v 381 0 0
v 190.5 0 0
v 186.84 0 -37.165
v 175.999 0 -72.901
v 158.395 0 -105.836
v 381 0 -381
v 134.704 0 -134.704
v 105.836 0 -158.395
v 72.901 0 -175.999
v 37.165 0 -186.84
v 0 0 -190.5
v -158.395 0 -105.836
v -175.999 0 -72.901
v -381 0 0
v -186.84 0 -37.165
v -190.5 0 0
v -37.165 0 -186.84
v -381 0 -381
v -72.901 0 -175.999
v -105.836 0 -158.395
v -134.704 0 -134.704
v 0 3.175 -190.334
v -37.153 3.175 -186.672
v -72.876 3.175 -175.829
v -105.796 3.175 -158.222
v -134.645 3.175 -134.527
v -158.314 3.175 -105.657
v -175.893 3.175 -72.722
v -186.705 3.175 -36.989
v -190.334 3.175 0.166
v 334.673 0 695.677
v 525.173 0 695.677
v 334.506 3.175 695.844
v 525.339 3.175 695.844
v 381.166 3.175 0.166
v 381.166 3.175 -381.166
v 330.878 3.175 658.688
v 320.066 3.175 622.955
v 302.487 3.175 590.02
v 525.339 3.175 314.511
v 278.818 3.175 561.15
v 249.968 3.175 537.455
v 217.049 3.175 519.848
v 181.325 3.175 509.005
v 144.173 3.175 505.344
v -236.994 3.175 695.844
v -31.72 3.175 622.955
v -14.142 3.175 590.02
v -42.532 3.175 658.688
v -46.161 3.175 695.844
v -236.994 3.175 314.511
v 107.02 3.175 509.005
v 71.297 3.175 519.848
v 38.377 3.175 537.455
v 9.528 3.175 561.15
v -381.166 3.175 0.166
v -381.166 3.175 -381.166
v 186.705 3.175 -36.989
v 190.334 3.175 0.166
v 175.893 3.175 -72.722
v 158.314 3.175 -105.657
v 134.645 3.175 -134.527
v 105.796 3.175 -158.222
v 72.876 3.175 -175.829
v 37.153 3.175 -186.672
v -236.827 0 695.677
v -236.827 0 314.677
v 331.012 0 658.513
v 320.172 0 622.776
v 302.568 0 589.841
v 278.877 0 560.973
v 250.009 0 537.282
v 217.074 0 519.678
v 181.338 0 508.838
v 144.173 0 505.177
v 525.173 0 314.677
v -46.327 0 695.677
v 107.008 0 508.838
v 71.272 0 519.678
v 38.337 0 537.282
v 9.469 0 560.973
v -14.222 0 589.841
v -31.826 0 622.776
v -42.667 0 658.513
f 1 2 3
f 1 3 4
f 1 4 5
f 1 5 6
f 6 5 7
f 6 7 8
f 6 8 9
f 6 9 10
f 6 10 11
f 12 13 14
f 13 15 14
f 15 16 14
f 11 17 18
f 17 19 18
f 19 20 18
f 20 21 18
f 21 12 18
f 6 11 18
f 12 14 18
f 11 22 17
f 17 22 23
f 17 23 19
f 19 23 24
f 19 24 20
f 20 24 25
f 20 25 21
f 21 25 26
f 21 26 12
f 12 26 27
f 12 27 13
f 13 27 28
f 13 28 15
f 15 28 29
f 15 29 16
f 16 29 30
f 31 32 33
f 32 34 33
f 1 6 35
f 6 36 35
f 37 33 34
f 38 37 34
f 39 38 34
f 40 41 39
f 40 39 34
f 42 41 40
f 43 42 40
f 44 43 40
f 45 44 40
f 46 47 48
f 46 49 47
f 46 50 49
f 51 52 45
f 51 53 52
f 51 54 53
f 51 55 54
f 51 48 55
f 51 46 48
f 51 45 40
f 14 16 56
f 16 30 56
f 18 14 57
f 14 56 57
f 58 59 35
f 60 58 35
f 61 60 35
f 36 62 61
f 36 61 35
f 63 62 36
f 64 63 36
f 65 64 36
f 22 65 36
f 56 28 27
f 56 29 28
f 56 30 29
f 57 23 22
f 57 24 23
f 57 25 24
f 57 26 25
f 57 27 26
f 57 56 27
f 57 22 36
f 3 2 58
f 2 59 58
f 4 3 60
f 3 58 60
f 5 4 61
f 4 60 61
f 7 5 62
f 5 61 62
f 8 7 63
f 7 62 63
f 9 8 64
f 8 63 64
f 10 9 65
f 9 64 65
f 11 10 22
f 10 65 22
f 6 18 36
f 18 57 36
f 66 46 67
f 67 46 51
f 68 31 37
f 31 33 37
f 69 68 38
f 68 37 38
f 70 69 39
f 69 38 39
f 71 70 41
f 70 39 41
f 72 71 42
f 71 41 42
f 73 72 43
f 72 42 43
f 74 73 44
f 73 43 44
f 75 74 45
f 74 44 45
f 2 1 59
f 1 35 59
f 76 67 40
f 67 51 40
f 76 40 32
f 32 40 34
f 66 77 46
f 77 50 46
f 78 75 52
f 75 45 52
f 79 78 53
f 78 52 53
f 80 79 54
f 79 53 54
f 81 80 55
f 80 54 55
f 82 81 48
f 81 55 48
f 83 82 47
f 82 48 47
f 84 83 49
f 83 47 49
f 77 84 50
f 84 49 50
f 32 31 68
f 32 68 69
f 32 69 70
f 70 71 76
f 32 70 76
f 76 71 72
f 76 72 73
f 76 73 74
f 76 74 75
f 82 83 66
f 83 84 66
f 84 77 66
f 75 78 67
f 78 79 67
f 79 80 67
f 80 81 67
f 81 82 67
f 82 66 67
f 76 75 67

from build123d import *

# Parameters (mm, degrees)
F1_DEPTH = 3.175
F1_TAPER = -3
F2_DEPTH = 3.175


with BuildPart() as f1:
    # F0 (on Front) → F1 (new body)
    with BuildSketch(Plane.XZ):
        with BuildLine():
            ThreePointArc((144.1728167931, 505.1773030703), (9.4689749771, 560.9734612542), (-46.3271832069, 695.6773030703))
            Line((-46.3271832069, 695.6773030703), (-236.8271832069, 695.6773030703))
            Line((-236.8271832069, 695.6773030703), (-236.8271832069, 314.6773030703))
            Line((-236.8271832069, 314.6773030703), (144.1728167931, 314.6773030703))
            Line((144.1728167931, 314.6773030703), (525.1728167931, 314.6773030703))
            Line((525.1728167931, 314.6773030703), (525.1728167931, 695.6773030703))
            Line((525.1728167931, 695.6773030703), (334.6728167931, 695.6773030703))
            ThreePointArc((334.6728167931, 695.6773030703), (278.8766586092, 560.9734612542), (144.1728167931, 505.1773030703))
        make_face()
    extrude(amount=-F1_DEPTH, taper=F1_TAPER)


with BuildPart() as f1b:
    # F0 (on Front) → F1, piece 2 (new body)
    with BuildSketch(Plane.XZ):
        with BuildLine():
            ThreePointArc((0, -190.5), (-134.703841816, -134.703841816), (-190.5, 0))
            Line((-190.5, 0), (-381, 0))
            Line((-381, 0), (-381, -381))
            Line((-381, -381), (0, -381))
            Line((0, -381), (381, -381))
            Line((381, -381), (381, 0))
            Line((381, 0), (190.5, 0))
            ThreePointArc((190.5, 0), (134.703841816, -134.703841816), (0, -190.5))
        make_face()
    extrude(amount=-F1_DEPTH, taper=F1_TAPER)

    # F0 (on Front) → F2 (join)
    with BuildSketch(Plane.XZ):
        with BuildLine():
            ThreePointArc((0, -190.5), (-134.703841816, -134.703841816), (-190.5, 0))
            Line((-190.5, 0), (-381, 0))
            Line((-381, 0), (-381, -381))
            Line((-381, -381), (0, -381))
            Line((0, -381), (381, -381))
            Line((381, -381), (381, 0))
            Line((381, 0), (190.5, 0))
            ThreePointArc((190.5, 0), (134.703841816, -134.703841816), (0, -190.5))
        make_face()
    extrude(amount=-F2_DEPTH)


solid = Compound([f1.part, f1b.part])
